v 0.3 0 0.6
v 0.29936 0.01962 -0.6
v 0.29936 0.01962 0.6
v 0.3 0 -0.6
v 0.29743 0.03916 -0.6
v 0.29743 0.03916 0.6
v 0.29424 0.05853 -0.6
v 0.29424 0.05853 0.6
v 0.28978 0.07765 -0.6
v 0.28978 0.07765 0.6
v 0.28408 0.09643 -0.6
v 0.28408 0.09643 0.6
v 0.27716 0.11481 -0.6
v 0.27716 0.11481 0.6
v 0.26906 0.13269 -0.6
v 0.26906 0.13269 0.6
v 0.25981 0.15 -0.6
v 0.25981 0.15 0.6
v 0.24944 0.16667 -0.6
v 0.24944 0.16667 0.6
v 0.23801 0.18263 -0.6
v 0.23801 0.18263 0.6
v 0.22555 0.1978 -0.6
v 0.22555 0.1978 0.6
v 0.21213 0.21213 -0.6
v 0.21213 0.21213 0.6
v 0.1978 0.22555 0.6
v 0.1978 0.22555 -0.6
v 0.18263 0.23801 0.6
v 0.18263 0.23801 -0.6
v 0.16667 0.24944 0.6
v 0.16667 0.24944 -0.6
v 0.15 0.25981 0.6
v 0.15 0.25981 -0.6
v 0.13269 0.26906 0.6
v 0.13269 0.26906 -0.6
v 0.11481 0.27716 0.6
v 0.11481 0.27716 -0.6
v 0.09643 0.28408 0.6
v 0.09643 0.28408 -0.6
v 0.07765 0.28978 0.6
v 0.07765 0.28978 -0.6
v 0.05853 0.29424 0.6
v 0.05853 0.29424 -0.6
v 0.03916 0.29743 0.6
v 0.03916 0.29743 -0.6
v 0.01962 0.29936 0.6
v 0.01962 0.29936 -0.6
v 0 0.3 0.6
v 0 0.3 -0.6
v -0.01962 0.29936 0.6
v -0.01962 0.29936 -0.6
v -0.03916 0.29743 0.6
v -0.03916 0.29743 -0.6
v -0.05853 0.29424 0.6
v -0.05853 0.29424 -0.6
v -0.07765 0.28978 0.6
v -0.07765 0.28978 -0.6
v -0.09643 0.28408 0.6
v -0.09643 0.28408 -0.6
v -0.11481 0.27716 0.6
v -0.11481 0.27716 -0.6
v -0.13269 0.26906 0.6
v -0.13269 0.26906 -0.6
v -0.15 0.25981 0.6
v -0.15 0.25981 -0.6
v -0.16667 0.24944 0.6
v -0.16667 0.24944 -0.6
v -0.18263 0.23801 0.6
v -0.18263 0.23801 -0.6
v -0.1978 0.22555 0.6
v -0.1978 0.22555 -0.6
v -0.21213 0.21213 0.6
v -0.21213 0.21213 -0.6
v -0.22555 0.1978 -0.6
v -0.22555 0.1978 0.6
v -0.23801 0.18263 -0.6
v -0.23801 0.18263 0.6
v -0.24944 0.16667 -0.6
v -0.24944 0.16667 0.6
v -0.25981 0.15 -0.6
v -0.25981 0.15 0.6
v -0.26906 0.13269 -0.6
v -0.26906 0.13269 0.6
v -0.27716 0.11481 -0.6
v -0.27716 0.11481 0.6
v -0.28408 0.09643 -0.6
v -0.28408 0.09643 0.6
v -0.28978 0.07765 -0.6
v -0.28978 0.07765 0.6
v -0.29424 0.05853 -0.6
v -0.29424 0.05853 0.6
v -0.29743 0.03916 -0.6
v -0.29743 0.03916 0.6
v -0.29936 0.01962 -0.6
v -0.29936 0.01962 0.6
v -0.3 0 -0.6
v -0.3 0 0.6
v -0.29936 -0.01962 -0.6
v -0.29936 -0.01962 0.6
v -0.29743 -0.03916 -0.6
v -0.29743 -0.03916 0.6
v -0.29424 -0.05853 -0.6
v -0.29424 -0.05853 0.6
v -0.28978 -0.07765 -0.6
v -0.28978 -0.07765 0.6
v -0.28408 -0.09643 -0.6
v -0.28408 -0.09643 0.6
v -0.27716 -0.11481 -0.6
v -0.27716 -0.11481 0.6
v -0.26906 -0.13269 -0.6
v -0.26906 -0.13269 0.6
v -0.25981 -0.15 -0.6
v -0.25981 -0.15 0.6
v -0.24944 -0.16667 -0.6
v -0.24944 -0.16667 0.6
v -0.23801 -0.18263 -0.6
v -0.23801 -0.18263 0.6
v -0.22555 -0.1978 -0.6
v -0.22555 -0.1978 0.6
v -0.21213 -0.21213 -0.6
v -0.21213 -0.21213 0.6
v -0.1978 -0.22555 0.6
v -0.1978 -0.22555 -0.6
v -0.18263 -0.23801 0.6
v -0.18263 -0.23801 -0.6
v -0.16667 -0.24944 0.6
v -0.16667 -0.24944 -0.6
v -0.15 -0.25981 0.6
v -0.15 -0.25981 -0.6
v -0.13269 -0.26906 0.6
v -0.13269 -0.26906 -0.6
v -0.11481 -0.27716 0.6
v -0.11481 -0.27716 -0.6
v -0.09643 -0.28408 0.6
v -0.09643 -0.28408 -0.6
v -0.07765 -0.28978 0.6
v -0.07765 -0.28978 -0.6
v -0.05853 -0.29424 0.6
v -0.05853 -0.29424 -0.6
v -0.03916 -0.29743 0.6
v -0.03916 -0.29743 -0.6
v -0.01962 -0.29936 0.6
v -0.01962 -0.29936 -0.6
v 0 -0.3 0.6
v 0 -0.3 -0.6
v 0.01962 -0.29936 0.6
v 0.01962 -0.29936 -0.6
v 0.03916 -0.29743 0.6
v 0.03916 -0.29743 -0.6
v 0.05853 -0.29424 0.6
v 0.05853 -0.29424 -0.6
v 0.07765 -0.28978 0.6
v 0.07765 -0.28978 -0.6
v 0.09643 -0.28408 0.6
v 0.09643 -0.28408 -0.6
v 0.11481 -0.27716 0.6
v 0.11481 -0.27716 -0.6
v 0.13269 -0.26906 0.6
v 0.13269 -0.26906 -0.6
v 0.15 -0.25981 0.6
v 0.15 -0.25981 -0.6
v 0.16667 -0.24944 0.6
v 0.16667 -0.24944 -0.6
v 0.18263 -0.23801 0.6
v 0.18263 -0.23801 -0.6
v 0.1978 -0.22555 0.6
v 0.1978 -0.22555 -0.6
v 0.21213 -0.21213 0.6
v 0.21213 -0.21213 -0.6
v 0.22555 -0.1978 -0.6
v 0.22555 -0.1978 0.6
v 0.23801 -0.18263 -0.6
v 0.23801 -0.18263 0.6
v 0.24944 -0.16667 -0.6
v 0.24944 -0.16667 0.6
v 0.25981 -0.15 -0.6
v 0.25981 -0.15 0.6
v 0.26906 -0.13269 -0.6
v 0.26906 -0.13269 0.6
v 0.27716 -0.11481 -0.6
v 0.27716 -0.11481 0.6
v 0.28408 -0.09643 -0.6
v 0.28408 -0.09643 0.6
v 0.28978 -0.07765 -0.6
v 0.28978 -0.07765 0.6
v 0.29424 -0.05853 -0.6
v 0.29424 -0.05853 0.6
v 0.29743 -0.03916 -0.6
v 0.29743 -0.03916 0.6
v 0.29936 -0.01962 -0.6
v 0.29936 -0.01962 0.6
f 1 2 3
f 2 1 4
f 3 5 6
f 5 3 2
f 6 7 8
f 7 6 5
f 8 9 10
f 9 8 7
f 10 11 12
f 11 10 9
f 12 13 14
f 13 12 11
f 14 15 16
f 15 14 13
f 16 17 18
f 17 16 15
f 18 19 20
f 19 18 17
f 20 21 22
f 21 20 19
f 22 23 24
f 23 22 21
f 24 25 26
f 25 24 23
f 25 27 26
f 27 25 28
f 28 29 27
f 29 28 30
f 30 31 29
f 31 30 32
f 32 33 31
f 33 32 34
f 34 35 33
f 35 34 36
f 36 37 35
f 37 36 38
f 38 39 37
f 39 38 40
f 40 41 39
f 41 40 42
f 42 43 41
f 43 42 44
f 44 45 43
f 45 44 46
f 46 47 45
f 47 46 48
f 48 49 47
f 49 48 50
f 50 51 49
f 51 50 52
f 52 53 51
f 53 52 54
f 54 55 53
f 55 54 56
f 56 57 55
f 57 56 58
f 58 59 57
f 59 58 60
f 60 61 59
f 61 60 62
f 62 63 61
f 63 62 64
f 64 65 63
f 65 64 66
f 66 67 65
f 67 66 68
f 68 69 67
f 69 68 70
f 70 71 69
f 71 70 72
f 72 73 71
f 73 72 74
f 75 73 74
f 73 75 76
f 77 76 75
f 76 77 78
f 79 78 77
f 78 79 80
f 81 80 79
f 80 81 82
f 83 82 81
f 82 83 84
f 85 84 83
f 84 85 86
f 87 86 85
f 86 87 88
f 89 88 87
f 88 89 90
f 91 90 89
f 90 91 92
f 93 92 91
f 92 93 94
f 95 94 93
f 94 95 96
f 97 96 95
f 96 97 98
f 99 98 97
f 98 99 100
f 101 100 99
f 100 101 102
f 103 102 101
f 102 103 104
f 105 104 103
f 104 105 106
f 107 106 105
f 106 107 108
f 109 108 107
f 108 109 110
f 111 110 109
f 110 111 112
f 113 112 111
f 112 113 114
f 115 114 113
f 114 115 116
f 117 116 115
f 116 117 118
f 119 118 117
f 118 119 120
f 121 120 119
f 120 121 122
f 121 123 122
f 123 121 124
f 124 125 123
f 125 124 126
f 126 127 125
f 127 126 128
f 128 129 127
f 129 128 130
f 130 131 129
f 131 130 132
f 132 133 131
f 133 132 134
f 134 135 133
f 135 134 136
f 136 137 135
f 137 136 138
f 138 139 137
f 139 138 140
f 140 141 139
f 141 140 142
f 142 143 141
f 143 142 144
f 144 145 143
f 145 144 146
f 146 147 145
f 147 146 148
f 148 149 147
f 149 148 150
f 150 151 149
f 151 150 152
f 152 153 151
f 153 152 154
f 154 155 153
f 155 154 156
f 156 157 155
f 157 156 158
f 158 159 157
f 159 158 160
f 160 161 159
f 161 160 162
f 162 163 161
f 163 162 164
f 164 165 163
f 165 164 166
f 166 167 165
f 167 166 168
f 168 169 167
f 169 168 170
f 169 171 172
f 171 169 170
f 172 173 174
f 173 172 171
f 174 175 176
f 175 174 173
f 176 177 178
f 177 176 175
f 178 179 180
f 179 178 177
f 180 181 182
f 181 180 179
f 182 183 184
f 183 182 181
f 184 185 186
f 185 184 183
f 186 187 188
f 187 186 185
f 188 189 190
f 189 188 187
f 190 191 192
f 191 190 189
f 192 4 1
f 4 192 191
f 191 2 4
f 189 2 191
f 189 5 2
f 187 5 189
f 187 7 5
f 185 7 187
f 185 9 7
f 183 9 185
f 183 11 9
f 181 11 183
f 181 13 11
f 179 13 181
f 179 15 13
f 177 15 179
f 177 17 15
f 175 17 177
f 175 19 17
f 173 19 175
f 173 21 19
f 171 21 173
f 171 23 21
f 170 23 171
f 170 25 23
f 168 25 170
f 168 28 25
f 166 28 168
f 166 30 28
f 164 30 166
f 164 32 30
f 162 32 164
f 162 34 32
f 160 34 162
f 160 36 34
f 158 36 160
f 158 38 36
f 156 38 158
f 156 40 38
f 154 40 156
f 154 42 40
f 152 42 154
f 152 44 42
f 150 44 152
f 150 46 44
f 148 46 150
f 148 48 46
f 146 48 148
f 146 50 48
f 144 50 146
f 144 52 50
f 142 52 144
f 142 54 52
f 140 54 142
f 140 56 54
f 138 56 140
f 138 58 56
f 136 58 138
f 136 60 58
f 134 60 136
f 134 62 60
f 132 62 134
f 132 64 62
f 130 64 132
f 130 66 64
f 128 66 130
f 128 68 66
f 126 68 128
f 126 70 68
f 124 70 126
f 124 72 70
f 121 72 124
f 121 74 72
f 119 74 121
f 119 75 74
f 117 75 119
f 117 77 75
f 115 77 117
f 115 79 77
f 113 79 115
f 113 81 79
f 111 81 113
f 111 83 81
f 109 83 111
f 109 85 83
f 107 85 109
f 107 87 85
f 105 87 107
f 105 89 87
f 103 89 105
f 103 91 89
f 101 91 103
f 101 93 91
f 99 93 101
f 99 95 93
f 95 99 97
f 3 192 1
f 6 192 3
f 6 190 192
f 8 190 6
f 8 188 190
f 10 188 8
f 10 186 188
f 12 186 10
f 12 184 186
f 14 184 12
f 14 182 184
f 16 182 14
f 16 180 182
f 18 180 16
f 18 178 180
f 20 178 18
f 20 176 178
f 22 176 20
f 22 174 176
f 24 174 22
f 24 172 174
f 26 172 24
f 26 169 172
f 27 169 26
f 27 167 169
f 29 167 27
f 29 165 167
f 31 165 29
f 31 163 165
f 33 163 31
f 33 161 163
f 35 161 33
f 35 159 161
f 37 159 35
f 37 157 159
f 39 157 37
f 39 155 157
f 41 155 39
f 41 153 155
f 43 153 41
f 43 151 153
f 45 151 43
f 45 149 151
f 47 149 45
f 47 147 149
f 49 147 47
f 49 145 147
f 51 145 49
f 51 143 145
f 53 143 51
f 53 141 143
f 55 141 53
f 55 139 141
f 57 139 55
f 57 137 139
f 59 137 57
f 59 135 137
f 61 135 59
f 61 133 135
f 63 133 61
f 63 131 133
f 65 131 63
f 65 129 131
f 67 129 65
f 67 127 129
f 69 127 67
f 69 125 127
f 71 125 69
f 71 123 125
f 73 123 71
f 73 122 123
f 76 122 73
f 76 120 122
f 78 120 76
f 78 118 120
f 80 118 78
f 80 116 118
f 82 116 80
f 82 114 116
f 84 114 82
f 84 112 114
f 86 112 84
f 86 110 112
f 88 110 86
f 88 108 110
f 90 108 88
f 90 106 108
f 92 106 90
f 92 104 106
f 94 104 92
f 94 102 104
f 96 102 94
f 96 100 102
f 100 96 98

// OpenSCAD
// ========================================
// a cylinder radius 0.3 height 1.2
// Generated by cad-agent text-to-CAD
// ========================================
$fn = 96;

union() {
  // component: body (body)
  cylinder(r=0.3, h=1.2, center=true);
}
